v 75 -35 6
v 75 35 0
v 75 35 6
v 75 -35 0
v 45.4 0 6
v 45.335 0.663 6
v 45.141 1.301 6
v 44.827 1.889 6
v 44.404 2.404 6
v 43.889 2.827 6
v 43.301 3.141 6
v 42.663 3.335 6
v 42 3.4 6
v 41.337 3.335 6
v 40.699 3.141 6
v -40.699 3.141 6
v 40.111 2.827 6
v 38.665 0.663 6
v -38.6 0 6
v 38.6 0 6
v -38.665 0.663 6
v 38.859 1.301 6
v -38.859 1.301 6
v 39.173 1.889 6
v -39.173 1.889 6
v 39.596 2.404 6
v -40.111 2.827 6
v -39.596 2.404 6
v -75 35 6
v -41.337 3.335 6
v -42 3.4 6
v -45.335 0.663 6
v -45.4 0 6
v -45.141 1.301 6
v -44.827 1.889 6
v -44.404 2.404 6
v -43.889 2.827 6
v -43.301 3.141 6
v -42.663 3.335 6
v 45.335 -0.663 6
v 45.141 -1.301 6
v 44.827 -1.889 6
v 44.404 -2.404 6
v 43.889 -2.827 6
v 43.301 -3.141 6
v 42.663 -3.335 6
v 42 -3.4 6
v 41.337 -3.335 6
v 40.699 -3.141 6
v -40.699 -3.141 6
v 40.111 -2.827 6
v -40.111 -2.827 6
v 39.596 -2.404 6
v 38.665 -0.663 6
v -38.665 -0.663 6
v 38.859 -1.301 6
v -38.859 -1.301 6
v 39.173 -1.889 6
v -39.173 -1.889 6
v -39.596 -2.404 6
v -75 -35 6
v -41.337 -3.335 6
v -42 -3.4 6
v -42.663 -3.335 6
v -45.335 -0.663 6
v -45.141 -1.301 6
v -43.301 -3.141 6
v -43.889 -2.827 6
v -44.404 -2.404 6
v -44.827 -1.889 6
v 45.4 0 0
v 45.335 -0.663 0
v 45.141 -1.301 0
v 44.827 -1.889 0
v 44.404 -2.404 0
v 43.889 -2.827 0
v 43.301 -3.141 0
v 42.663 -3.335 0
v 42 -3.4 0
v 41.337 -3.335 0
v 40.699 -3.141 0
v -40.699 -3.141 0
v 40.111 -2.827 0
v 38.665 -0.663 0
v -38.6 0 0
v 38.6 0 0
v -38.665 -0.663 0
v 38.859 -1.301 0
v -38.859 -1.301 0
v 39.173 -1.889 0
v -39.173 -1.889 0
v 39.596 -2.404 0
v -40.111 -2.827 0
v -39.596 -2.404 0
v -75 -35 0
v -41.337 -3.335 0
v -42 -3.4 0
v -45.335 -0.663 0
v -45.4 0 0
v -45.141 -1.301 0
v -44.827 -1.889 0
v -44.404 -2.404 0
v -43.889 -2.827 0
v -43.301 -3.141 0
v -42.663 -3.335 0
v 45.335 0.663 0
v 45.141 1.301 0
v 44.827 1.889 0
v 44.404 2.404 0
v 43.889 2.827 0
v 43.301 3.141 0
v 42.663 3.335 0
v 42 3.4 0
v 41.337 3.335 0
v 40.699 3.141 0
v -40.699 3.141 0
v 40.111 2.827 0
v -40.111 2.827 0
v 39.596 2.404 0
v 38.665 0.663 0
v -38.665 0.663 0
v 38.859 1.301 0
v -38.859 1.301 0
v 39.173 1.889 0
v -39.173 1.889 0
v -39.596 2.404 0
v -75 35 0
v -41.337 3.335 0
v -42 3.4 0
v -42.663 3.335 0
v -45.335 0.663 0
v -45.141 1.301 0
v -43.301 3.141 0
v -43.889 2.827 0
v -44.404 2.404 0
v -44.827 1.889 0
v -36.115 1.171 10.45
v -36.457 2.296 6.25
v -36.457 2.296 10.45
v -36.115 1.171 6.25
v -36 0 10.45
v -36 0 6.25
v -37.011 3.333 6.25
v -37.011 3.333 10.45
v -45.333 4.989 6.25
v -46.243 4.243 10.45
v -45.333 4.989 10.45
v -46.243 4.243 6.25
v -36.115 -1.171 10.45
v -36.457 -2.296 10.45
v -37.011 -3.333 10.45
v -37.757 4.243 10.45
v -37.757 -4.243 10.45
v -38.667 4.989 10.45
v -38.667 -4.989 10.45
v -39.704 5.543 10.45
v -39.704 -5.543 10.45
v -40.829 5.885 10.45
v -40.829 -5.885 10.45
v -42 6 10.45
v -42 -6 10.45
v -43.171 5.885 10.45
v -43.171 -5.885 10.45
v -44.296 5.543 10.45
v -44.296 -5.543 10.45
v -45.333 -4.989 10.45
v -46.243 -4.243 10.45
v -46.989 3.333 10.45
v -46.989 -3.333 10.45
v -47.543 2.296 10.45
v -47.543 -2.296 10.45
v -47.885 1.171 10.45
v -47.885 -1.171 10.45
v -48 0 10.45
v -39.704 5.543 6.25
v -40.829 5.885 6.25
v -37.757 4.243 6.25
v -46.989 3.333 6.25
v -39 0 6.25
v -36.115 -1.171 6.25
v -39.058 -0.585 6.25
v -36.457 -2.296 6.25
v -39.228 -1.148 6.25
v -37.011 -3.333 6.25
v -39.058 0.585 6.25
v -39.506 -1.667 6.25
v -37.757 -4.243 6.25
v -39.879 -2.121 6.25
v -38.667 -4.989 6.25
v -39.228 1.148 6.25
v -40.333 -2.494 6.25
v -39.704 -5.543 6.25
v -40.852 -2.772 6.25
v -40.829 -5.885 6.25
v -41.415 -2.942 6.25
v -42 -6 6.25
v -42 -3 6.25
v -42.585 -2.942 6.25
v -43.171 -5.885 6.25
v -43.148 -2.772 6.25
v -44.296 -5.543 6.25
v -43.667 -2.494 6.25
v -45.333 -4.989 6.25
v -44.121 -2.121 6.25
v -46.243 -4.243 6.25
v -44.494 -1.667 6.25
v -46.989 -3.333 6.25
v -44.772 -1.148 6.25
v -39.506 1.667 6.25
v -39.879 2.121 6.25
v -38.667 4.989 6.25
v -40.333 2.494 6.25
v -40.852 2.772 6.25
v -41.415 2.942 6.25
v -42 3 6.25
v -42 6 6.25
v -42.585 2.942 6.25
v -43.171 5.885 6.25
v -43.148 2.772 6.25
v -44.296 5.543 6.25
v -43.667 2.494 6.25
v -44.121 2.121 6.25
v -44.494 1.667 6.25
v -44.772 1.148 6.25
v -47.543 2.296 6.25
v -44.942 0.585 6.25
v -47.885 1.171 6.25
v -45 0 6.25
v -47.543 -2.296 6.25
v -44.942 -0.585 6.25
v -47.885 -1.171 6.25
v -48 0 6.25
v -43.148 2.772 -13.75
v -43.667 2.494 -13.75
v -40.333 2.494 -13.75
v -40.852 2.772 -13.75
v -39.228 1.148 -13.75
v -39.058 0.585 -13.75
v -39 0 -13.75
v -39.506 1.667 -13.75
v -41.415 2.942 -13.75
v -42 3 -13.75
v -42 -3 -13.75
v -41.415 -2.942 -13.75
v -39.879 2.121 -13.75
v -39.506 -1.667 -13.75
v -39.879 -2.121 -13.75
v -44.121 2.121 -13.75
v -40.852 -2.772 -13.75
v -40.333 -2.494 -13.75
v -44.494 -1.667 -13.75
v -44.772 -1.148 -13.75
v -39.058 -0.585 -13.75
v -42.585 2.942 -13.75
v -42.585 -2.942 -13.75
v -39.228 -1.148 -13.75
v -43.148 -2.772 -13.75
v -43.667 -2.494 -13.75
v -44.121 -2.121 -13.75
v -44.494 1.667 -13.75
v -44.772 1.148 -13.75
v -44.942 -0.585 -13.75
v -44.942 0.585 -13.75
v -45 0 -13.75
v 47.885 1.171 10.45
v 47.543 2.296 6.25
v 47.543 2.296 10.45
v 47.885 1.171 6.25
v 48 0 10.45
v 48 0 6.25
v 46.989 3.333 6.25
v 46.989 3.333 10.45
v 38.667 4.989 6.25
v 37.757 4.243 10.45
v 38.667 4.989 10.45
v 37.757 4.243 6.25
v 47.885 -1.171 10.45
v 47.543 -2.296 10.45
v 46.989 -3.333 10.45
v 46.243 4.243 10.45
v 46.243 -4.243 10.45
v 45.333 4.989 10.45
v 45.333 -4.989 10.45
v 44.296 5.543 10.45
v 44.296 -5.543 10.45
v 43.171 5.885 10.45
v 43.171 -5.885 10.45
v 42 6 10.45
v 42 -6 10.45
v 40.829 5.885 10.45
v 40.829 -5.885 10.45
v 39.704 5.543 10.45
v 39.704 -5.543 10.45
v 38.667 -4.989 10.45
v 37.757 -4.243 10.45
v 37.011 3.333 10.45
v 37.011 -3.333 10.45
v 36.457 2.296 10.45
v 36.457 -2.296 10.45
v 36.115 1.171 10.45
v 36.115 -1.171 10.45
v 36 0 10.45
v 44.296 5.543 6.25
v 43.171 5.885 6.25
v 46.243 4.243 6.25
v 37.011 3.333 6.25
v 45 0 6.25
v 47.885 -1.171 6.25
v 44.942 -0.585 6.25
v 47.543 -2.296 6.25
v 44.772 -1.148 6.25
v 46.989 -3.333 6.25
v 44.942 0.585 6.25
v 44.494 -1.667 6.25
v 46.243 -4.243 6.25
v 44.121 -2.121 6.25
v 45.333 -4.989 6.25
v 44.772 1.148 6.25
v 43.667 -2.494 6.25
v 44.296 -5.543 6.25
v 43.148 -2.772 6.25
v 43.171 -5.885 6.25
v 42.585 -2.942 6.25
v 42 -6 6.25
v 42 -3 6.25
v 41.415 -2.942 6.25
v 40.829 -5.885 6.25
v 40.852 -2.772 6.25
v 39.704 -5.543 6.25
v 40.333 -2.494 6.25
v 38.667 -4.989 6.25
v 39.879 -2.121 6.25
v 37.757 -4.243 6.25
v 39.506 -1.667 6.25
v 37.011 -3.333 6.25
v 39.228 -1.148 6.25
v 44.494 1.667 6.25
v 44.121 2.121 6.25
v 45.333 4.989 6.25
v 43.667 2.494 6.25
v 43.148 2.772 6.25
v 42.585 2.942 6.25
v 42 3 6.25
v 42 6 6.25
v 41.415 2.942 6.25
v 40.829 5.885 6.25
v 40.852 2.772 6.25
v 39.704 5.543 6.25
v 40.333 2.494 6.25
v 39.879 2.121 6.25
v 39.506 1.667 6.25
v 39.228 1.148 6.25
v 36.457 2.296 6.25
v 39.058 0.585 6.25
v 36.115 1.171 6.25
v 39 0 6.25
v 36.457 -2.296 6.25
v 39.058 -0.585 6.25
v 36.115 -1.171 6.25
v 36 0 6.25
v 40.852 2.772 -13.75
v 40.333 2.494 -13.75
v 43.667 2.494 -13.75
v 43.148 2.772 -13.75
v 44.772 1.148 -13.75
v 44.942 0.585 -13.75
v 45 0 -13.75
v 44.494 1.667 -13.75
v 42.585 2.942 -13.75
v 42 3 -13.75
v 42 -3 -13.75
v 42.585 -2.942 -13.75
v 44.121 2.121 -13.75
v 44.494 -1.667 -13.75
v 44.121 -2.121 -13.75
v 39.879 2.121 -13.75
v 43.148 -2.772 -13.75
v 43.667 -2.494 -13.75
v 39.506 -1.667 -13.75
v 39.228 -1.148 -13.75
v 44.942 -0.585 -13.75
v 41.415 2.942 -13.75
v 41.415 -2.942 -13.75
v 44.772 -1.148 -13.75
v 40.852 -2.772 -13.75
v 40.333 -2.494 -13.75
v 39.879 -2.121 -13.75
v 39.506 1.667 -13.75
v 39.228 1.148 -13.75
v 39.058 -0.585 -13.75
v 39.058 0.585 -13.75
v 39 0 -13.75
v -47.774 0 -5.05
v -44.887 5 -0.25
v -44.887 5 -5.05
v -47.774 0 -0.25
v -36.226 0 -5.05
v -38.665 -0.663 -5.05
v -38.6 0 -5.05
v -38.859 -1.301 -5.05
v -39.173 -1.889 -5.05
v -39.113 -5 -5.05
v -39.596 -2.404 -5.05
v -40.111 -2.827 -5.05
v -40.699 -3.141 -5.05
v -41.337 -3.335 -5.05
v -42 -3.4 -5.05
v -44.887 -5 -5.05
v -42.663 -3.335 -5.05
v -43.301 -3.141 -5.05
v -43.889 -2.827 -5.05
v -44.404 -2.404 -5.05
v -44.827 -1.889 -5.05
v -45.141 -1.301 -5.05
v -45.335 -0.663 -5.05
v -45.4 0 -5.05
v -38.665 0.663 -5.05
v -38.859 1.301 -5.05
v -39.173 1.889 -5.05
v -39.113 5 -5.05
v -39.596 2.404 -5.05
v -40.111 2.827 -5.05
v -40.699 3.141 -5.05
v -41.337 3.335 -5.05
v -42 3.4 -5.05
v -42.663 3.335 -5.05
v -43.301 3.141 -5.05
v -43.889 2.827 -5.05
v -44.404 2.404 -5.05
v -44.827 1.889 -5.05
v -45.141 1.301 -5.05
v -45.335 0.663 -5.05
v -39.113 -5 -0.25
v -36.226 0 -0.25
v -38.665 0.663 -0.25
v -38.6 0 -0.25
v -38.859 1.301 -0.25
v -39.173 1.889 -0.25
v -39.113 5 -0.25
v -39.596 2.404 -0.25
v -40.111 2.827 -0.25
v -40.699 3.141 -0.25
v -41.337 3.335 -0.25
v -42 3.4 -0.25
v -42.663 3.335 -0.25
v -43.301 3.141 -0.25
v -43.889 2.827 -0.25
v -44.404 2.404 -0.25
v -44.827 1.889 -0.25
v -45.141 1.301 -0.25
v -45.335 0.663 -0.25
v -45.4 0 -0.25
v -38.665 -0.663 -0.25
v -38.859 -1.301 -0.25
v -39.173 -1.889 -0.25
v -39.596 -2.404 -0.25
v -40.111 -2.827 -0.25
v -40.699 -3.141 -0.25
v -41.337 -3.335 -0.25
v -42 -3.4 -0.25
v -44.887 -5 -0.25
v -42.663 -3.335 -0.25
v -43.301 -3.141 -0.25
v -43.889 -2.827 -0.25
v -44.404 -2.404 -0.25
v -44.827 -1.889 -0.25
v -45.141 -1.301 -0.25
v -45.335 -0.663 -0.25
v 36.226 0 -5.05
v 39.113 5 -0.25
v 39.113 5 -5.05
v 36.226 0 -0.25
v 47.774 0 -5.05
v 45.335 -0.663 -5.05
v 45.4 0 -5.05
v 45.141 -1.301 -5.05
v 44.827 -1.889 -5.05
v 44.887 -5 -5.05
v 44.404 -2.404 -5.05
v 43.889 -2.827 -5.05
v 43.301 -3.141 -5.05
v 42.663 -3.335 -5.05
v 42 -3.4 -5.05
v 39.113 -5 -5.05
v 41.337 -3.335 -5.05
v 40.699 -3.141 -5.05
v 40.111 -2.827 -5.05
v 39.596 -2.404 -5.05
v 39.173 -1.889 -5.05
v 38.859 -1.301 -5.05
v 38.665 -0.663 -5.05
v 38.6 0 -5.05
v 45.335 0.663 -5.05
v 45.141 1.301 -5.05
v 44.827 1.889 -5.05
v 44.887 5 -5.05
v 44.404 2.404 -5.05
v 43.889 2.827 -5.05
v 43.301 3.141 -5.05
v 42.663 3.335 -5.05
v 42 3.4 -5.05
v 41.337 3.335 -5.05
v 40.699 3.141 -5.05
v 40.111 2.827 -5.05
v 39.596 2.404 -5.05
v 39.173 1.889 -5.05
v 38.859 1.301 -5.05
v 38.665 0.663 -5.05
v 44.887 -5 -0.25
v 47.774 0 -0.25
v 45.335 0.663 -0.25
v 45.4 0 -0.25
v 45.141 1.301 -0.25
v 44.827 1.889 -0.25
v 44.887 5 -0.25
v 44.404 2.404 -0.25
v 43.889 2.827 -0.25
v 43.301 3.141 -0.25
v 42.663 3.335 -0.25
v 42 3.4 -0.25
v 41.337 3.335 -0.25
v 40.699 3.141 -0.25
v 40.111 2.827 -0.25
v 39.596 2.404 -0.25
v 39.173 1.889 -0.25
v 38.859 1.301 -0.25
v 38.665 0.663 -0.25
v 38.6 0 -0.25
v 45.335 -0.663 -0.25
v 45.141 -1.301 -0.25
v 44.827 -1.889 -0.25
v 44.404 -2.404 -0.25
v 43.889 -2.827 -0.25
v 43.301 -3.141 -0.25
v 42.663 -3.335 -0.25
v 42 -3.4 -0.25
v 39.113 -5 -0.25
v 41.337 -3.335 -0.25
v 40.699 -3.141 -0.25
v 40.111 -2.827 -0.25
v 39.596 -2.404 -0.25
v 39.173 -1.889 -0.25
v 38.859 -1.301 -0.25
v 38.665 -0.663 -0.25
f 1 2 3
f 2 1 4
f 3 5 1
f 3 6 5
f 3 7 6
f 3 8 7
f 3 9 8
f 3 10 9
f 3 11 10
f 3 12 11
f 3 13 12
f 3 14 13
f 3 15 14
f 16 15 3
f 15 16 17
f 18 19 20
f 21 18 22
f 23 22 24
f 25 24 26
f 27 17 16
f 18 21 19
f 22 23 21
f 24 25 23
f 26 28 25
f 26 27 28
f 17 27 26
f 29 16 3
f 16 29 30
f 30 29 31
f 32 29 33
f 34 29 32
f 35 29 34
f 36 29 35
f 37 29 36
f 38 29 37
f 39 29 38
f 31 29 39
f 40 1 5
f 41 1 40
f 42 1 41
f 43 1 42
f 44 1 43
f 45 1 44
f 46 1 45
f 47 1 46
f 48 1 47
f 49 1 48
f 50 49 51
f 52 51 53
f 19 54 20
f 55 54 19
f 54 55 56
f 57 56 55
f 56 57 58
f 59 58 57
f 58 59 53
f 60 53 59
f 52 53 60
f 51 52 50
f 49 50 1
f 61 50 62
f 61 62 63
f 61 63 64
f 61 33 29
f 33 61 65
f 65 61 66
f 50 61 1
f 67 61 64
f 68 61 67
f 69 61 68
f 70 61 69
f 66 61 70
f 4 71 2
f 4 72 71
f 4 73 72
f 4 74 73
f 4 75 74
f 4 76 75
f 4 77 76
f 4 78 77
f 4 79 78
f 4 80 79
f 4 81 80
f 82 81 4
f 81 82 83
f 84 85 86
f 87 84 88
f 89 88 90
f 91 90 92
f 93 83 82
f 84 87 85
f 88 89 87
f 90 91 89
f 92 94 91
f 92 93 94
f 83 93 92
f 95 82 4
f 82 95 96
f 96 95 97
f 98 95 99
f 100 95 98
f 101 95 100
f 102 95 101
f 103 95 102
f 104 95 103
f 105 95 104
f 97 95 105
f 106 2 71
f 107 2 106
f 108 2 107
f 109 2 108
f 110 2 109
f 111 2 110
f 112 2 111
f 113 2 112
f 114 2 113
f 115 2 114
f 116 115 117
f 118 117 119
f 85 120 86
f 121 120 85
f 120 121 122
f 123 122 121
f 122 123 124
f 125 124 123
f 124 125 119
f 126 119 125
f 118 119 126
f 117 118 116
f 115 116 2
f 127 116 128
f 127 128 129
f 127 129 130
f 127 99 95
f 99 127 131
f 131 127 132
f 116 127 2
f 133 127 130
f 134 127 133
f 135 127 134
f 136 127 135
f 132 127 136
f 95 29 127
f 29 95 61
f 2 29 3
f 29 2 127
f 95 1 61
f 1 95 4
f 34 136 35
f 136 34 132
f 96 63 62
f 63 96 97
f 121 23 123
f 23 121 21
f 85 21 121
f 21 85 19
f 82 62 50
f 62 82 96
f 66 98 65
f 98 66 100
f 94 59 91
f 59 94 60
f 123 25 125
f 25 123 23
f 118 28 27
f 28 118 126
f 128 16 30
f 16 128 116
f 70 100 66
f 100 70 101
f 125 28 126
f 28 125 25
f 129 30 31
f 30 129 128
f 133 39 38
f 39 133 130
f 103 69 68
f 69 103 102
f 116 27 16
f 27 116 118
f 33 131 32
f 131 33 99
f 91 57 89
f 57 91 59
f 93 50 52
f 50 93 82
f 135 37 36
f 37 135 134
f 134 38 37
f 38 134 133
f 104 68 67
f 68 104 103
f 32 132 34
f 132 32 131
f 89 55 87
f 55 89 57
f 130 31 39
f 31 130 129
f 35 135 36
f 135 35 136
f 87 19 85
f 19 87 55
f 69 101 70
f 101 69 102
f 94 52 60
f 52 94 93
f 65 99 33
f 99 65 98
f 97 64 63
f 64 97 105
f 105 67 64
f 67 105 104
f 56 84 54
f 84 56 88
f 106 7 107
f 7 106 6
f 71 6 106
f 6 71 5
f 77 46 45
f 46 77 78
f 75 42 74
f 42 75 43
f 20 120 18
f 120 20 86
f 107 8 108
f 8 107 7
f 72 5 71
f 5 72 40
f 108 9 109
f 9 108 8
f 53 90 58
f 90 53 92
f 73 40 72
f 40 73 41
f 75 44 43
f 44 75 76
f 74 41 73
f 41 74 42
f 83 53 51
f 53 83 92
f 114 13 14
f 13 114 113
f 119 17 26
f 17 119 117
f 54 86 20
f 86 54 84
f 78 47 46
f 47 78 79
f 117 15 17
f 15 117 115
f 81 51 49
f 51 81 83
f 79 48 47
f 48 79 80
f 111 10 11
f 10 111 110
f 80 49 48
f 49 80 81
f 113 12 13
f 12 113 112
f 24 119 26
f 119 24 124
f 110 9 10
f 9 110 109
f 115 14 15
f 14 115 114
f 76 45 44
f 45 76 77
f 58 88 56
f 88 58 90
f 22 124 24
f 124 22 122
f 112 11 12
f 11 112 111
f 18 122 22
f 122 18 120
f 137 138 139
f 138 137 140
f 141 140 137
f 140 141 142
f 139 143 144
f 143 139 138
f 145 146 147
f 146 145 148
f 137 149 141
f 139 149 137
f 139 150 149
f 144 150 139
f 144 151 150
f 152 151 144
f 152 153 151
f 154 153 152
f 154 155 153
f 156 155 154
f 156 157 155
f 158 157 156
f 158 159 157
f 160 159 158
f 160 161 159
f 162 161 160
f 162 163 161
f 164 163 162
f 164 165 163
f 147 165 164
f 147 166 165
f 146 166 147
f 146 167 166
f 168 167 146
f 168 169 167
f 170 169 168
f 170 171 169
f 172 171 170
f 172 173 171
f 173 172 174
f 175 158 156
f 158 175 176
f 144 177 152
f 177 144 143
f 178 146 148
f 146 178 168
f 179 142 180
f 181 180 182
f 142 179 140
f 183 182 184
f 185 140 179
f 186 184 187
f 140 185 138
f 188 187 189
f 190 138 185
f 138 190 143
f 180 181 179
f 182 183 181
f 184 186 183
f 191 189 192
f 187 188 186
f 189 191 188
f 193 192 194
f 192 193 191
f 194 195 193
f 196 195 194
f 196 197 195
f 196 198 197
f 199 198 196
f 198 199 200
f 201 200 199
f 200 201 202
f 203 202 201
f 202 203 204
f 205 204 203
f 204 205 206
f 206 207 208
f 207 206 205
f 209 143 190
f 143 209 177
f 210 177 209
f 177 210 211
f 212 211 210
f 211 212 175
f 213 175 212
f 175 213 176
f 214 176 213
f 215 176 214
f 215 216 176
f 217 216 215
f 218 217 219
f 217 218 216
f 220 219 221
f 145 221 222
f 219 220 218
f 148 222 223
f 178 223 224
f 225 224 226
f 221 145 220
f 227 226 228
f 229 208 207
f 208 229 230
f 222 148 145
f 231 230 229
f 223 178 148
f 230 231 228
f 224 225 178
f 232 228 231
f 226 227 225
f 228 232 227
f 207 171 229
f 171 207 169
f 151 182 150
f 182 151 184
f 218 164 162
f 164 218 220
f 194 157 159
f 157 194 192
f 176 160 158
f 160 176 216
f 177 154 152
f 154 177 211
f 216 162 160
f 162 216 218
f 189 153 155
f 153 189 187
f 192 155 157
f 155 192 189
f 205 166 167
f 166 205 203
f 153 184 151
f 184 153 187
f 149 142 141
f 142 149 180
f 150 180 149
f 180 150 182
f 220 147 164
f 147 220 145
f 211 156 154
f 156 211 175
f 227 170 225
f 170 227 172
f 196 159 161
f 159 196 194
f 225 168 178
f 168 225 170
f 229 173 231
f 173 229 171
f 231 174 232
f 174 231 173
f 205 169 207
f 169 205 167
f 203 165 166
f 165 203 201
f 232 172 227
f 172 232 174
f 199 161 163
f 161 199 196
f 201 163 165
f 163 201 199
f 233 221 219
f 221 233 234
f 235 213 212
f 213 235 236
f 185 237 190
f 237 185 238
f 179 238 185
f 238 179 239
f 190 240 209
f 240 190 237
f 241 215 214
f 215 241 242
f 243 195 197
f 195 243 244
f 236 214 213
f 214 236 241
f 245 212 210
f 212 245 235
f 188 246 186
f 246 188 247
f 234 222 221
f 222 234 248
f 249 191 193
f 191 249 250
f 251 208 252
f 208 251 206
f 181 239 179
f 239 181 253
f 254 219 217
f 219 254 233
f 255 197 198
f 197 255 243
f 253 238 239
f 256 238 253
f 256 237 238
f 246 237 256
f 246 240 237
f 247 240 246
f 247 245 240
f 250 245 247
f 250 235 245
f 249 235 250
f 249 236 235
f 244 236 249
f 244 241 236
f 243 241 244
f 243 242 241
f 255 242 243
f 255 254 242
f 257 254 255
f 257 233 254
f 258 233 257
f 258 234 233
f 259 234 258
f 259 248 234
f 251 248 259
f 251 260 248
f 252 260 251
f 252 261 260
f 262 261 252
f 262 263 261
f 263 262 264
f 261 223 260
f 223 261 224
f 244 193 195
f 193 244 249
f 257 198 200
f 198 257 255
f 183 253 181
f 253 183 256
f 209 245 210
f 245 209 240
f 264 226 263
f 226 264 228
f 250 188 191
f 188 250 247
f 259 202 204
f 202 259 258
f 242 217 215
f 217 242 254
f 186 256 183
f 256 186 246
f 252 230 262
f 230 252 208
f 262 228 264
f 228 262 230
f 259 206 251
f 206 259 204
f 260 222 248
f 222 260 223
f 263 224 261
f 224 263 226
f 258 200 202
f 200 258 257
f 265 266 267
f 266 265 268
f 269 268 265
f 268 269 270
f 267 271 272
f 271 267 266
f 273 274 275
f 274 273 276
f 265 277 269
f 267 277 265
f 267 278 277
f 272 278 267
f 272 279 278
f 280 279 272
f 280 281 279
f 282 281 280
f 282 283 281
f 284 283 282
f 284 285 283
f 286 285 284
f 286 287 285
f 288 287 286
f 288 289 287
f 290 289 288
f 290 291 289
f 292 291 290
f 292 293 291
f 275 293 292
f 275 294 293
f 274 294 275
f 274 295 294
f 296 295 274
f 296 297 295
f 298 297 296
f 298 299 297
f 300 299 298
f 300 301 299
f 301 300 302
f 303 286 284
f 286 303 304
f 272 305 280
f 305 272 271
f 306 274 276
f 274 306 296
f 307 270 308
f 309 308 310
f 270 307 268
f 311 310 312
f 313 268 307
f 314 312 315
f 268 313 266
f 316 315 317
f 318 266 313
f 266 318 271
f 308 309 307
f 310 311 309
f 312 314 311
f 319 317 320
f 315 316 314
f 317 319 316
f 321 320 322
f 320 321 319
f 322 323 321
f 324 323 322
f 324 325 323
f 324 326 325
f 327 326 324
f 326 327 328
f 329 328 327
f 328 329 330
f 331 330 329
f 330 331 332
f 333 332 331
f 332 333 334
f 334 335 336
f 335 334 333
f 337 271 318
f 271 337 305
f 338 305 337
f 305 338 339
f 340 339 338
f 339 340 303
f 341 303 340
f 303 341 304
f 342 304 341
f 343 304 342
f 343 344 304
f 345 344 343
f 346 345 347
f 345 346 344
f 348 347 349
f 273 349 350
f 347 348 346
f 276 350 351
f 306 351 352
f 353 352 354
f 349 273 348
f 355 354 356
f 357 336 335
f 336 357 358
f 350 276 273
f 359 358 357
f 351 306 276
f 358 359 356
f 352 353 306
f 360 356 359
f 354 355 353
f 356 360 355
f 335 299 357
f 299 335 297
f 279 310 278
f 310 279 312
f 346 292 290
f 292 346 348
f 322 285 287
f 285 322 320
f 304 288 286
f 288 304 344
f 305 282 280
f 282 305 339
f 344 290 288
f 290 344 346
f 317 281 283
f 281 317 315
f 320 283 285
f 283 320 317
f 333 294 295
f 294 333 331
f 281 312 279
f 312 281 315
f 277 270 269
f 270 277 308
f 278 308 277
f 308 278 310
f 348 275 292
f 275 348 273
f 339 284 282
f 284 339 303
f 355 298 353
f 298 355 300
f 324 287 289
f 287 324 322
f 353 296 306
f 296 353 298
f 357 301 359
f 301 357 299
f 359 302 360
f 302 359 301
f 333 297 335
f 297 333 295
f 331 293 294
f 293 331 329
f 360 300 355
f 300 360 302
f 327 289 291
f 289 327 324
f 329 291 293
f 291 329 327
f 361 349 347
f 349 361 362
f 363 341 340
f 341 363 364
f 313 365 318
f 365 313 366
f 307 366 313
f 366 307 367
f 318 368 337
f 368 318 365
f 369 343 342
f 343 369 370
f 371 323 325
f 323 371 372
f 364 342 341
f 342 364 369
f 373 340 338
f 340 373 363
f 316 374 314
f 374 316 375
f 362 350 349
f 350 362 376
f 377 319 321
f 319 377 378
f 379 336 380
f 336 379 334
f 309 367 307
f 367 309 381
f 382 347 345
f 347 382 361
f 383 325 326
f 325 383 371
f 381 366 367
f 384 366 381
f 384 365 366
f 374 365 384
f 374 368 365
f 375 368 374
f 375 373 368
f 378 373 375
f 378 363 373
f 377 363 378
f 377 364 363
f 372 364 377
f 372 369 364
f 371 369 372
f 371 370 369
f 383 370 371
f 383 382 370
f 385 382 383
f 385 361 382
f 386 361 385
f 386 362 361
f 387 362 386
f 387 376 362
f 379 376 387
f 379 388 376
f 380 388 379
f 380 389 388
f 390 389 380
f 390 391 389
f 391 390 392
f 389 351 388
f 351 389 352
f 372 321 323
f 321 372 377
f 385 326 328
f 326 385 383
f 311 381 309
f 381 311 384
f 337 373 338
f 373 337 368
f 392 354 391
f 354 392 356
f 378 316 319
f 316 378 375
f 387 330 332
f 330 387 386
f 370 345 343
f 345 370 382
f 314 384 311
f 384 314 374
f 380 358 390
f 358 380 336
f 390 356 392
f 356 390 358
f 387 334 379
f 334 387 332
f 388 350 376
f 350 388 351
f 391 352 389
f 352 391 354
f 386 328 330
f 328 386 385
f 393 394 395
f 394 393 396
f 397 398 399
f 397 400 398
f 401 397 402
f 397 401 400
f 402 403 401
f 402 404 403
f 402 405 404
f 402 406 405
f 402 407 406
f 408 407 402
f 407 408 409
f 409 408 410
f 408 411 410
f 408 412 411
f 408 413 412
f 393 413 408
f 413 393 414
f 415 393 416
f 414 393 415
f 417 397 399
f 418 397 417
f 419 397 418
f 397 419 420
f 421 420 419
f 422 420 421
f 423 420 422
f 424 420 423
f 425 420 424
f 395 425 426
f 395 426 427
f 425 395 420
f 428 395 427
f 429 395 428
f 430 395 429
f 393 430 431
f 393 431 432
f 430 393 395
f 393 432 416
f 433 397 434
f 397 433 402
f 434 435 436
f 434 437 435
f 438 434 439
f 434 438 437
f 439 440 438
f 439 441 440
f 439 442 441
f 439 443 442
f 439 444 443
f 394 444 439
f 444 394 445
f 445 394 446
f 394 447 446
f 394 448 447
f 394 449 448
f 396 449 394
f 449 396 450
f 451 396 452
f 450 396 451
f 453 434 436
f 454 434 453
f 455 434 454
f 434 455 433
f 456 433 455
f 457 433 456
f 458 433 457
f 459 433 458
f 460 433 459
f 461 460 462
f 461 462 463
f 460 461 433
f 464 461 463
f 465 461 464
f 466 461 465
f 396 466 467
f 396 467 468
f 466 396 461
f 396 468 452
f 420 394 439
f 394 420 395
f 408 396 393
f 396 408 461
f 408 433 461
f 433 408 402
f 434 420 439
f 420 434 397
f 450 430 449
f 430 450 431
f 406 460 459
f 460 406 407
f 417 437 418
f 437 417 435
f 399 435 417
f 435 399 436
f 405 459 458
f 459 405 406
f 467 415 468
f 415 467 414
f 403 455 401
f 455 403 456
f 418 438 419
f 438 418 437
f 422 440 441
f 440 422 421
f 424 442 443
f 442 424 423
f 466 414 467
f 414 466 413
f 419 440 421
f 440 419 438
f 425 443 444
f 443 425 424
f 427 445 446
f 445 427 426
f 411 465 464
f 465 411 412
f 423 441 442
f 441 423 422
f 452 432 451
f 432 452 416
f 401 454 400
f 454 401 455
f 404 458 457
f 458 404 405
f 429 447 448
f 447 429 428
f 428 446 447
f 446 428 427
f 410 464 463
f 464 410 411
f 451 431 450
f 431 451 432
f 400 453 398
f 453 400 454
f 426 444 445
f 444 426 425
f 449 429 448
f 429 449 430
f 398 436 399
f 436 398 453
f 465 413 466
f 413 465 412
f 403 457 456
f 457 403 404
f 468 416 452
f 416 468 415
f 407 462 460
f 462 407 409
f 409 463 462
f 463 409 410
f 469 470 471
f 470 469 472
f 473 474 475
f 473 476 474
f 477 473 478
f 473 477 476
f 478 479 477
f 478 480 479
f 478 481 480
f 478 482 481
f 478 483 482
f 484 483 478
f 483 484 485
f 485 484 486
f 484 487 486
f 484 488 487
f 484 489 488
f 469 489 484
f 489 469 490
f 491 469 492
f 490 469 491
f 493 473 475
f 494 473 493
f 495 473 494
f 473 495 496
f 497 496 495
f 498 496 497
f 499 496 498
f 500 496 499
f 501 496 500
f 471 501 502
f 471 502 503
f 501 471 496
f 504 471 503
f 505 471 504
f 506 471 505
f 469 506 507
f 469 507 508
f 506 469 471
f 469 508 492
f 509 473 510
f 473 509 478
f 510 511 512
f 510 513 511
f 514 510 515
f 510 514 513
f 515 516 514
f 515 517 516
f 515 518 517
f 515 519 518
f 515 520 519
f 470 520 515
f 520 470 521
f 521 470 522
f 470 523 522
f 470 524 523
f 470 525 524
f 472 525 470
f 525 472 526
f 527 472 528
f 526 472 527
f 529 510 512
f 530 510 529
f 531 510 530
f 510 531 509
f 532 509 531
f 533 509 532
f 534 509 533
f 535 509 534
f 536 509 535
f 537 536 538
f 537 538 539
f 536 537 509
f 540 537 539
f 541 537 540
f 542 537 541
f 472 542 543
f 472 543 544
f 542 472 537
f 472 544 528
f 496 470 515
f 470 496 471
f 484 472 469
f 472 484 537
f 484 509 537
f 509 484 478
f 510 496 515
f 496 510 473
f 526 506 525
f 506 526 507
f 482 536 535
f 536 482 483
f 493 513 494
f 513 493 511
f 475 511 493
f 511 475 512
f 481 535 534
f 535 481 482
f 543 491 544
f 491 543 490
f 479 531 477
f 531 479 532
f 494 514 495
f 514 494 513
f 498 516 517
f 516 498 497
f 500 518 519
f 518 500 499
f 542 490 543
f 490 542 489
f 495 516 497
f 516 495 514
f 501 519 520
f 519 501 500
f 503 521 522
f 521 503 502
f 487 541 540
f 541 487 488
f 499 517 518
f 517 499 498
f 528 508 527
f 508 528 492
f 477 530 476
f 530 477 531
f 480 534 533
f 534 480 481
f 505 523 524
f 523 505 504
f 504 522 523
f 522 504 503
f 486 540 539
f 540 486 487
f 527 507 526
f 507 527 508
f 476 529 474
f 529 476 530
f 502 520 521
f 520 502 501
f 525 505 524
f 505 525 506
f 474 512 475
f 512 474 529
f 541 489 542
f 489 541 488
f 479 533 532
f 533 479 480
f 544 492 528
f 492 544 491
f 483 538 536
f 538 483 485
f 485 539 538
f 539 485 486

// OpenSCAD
$fn = 32;

// ------------------------------------------------------------------------
// Bolted plate: 150 x 70 x 6 mm plate, 2 fasteners
// Every part is its own module, assembly() places them once.
// ------------------------------------------------------------------------

// --- part 1 ---
module plate() {
  difference() {
    translate([-75, -35, 0]) cube([150, 70, 6]);
    translate([-42, 0, -1]) cylinder(h = 8, d = 6.8);
    translate([42, 0, -1]) cylinder(h = 8, d = 6.8);
  }
}

// --- part 2 ---
module bolt1() {
  cylinder(h = 4.2, d = 12);
  translate([0, 0, -20]) cylinder(h = 20, d = 6);
}

// --- part 3 ---
module bolt2() {
  cylinder(h = 4.2, d = 12);
  translate([0, 0, -20]) cylinder(h = 20, d = 6);
}

// --- part 4 ---
module nut1() {
  difference() {
    linear_extrude(height = 4.8) polygon(points = [[5.774, 0], [2.887, 5], [-2.887, 5], [-5.774, 0], [-2.887, -5], [2.887, -5]]);
    translate([0, 0, -1]) cylinder(h = 6.8, d = 6.8);
  }
}

// --- part 5 ---
module nut2() {
  difference() {
    linear_extrude(height = 4.8) polygon(points = [[5.774, 0], [2.887, 5], [-2.887, 5], [-5.774, 0], [-2.887, -5], [2.887, -5]]);
    translate([0, 0, -1]) cylinder(h = 6.8, d = 6.8);
  }
}

// --- assembly ---
module assembly() {
  translate([0, 0, 0]) rotate([0, 0, 0]) plate();
  translate([-42, 0, 6.25]) rotate([0, 0, 0]) bolt1();
  translate([42, 0, 6.25]) rotate([0, 0, 0]) bolt2();
  translate([-42, 0, -5.05]) rotate([0, 0, 0]) nut1();
  translate([42, 0, -5.05]) rotate([0, 0, 0]) nut2();
}

assembly();
